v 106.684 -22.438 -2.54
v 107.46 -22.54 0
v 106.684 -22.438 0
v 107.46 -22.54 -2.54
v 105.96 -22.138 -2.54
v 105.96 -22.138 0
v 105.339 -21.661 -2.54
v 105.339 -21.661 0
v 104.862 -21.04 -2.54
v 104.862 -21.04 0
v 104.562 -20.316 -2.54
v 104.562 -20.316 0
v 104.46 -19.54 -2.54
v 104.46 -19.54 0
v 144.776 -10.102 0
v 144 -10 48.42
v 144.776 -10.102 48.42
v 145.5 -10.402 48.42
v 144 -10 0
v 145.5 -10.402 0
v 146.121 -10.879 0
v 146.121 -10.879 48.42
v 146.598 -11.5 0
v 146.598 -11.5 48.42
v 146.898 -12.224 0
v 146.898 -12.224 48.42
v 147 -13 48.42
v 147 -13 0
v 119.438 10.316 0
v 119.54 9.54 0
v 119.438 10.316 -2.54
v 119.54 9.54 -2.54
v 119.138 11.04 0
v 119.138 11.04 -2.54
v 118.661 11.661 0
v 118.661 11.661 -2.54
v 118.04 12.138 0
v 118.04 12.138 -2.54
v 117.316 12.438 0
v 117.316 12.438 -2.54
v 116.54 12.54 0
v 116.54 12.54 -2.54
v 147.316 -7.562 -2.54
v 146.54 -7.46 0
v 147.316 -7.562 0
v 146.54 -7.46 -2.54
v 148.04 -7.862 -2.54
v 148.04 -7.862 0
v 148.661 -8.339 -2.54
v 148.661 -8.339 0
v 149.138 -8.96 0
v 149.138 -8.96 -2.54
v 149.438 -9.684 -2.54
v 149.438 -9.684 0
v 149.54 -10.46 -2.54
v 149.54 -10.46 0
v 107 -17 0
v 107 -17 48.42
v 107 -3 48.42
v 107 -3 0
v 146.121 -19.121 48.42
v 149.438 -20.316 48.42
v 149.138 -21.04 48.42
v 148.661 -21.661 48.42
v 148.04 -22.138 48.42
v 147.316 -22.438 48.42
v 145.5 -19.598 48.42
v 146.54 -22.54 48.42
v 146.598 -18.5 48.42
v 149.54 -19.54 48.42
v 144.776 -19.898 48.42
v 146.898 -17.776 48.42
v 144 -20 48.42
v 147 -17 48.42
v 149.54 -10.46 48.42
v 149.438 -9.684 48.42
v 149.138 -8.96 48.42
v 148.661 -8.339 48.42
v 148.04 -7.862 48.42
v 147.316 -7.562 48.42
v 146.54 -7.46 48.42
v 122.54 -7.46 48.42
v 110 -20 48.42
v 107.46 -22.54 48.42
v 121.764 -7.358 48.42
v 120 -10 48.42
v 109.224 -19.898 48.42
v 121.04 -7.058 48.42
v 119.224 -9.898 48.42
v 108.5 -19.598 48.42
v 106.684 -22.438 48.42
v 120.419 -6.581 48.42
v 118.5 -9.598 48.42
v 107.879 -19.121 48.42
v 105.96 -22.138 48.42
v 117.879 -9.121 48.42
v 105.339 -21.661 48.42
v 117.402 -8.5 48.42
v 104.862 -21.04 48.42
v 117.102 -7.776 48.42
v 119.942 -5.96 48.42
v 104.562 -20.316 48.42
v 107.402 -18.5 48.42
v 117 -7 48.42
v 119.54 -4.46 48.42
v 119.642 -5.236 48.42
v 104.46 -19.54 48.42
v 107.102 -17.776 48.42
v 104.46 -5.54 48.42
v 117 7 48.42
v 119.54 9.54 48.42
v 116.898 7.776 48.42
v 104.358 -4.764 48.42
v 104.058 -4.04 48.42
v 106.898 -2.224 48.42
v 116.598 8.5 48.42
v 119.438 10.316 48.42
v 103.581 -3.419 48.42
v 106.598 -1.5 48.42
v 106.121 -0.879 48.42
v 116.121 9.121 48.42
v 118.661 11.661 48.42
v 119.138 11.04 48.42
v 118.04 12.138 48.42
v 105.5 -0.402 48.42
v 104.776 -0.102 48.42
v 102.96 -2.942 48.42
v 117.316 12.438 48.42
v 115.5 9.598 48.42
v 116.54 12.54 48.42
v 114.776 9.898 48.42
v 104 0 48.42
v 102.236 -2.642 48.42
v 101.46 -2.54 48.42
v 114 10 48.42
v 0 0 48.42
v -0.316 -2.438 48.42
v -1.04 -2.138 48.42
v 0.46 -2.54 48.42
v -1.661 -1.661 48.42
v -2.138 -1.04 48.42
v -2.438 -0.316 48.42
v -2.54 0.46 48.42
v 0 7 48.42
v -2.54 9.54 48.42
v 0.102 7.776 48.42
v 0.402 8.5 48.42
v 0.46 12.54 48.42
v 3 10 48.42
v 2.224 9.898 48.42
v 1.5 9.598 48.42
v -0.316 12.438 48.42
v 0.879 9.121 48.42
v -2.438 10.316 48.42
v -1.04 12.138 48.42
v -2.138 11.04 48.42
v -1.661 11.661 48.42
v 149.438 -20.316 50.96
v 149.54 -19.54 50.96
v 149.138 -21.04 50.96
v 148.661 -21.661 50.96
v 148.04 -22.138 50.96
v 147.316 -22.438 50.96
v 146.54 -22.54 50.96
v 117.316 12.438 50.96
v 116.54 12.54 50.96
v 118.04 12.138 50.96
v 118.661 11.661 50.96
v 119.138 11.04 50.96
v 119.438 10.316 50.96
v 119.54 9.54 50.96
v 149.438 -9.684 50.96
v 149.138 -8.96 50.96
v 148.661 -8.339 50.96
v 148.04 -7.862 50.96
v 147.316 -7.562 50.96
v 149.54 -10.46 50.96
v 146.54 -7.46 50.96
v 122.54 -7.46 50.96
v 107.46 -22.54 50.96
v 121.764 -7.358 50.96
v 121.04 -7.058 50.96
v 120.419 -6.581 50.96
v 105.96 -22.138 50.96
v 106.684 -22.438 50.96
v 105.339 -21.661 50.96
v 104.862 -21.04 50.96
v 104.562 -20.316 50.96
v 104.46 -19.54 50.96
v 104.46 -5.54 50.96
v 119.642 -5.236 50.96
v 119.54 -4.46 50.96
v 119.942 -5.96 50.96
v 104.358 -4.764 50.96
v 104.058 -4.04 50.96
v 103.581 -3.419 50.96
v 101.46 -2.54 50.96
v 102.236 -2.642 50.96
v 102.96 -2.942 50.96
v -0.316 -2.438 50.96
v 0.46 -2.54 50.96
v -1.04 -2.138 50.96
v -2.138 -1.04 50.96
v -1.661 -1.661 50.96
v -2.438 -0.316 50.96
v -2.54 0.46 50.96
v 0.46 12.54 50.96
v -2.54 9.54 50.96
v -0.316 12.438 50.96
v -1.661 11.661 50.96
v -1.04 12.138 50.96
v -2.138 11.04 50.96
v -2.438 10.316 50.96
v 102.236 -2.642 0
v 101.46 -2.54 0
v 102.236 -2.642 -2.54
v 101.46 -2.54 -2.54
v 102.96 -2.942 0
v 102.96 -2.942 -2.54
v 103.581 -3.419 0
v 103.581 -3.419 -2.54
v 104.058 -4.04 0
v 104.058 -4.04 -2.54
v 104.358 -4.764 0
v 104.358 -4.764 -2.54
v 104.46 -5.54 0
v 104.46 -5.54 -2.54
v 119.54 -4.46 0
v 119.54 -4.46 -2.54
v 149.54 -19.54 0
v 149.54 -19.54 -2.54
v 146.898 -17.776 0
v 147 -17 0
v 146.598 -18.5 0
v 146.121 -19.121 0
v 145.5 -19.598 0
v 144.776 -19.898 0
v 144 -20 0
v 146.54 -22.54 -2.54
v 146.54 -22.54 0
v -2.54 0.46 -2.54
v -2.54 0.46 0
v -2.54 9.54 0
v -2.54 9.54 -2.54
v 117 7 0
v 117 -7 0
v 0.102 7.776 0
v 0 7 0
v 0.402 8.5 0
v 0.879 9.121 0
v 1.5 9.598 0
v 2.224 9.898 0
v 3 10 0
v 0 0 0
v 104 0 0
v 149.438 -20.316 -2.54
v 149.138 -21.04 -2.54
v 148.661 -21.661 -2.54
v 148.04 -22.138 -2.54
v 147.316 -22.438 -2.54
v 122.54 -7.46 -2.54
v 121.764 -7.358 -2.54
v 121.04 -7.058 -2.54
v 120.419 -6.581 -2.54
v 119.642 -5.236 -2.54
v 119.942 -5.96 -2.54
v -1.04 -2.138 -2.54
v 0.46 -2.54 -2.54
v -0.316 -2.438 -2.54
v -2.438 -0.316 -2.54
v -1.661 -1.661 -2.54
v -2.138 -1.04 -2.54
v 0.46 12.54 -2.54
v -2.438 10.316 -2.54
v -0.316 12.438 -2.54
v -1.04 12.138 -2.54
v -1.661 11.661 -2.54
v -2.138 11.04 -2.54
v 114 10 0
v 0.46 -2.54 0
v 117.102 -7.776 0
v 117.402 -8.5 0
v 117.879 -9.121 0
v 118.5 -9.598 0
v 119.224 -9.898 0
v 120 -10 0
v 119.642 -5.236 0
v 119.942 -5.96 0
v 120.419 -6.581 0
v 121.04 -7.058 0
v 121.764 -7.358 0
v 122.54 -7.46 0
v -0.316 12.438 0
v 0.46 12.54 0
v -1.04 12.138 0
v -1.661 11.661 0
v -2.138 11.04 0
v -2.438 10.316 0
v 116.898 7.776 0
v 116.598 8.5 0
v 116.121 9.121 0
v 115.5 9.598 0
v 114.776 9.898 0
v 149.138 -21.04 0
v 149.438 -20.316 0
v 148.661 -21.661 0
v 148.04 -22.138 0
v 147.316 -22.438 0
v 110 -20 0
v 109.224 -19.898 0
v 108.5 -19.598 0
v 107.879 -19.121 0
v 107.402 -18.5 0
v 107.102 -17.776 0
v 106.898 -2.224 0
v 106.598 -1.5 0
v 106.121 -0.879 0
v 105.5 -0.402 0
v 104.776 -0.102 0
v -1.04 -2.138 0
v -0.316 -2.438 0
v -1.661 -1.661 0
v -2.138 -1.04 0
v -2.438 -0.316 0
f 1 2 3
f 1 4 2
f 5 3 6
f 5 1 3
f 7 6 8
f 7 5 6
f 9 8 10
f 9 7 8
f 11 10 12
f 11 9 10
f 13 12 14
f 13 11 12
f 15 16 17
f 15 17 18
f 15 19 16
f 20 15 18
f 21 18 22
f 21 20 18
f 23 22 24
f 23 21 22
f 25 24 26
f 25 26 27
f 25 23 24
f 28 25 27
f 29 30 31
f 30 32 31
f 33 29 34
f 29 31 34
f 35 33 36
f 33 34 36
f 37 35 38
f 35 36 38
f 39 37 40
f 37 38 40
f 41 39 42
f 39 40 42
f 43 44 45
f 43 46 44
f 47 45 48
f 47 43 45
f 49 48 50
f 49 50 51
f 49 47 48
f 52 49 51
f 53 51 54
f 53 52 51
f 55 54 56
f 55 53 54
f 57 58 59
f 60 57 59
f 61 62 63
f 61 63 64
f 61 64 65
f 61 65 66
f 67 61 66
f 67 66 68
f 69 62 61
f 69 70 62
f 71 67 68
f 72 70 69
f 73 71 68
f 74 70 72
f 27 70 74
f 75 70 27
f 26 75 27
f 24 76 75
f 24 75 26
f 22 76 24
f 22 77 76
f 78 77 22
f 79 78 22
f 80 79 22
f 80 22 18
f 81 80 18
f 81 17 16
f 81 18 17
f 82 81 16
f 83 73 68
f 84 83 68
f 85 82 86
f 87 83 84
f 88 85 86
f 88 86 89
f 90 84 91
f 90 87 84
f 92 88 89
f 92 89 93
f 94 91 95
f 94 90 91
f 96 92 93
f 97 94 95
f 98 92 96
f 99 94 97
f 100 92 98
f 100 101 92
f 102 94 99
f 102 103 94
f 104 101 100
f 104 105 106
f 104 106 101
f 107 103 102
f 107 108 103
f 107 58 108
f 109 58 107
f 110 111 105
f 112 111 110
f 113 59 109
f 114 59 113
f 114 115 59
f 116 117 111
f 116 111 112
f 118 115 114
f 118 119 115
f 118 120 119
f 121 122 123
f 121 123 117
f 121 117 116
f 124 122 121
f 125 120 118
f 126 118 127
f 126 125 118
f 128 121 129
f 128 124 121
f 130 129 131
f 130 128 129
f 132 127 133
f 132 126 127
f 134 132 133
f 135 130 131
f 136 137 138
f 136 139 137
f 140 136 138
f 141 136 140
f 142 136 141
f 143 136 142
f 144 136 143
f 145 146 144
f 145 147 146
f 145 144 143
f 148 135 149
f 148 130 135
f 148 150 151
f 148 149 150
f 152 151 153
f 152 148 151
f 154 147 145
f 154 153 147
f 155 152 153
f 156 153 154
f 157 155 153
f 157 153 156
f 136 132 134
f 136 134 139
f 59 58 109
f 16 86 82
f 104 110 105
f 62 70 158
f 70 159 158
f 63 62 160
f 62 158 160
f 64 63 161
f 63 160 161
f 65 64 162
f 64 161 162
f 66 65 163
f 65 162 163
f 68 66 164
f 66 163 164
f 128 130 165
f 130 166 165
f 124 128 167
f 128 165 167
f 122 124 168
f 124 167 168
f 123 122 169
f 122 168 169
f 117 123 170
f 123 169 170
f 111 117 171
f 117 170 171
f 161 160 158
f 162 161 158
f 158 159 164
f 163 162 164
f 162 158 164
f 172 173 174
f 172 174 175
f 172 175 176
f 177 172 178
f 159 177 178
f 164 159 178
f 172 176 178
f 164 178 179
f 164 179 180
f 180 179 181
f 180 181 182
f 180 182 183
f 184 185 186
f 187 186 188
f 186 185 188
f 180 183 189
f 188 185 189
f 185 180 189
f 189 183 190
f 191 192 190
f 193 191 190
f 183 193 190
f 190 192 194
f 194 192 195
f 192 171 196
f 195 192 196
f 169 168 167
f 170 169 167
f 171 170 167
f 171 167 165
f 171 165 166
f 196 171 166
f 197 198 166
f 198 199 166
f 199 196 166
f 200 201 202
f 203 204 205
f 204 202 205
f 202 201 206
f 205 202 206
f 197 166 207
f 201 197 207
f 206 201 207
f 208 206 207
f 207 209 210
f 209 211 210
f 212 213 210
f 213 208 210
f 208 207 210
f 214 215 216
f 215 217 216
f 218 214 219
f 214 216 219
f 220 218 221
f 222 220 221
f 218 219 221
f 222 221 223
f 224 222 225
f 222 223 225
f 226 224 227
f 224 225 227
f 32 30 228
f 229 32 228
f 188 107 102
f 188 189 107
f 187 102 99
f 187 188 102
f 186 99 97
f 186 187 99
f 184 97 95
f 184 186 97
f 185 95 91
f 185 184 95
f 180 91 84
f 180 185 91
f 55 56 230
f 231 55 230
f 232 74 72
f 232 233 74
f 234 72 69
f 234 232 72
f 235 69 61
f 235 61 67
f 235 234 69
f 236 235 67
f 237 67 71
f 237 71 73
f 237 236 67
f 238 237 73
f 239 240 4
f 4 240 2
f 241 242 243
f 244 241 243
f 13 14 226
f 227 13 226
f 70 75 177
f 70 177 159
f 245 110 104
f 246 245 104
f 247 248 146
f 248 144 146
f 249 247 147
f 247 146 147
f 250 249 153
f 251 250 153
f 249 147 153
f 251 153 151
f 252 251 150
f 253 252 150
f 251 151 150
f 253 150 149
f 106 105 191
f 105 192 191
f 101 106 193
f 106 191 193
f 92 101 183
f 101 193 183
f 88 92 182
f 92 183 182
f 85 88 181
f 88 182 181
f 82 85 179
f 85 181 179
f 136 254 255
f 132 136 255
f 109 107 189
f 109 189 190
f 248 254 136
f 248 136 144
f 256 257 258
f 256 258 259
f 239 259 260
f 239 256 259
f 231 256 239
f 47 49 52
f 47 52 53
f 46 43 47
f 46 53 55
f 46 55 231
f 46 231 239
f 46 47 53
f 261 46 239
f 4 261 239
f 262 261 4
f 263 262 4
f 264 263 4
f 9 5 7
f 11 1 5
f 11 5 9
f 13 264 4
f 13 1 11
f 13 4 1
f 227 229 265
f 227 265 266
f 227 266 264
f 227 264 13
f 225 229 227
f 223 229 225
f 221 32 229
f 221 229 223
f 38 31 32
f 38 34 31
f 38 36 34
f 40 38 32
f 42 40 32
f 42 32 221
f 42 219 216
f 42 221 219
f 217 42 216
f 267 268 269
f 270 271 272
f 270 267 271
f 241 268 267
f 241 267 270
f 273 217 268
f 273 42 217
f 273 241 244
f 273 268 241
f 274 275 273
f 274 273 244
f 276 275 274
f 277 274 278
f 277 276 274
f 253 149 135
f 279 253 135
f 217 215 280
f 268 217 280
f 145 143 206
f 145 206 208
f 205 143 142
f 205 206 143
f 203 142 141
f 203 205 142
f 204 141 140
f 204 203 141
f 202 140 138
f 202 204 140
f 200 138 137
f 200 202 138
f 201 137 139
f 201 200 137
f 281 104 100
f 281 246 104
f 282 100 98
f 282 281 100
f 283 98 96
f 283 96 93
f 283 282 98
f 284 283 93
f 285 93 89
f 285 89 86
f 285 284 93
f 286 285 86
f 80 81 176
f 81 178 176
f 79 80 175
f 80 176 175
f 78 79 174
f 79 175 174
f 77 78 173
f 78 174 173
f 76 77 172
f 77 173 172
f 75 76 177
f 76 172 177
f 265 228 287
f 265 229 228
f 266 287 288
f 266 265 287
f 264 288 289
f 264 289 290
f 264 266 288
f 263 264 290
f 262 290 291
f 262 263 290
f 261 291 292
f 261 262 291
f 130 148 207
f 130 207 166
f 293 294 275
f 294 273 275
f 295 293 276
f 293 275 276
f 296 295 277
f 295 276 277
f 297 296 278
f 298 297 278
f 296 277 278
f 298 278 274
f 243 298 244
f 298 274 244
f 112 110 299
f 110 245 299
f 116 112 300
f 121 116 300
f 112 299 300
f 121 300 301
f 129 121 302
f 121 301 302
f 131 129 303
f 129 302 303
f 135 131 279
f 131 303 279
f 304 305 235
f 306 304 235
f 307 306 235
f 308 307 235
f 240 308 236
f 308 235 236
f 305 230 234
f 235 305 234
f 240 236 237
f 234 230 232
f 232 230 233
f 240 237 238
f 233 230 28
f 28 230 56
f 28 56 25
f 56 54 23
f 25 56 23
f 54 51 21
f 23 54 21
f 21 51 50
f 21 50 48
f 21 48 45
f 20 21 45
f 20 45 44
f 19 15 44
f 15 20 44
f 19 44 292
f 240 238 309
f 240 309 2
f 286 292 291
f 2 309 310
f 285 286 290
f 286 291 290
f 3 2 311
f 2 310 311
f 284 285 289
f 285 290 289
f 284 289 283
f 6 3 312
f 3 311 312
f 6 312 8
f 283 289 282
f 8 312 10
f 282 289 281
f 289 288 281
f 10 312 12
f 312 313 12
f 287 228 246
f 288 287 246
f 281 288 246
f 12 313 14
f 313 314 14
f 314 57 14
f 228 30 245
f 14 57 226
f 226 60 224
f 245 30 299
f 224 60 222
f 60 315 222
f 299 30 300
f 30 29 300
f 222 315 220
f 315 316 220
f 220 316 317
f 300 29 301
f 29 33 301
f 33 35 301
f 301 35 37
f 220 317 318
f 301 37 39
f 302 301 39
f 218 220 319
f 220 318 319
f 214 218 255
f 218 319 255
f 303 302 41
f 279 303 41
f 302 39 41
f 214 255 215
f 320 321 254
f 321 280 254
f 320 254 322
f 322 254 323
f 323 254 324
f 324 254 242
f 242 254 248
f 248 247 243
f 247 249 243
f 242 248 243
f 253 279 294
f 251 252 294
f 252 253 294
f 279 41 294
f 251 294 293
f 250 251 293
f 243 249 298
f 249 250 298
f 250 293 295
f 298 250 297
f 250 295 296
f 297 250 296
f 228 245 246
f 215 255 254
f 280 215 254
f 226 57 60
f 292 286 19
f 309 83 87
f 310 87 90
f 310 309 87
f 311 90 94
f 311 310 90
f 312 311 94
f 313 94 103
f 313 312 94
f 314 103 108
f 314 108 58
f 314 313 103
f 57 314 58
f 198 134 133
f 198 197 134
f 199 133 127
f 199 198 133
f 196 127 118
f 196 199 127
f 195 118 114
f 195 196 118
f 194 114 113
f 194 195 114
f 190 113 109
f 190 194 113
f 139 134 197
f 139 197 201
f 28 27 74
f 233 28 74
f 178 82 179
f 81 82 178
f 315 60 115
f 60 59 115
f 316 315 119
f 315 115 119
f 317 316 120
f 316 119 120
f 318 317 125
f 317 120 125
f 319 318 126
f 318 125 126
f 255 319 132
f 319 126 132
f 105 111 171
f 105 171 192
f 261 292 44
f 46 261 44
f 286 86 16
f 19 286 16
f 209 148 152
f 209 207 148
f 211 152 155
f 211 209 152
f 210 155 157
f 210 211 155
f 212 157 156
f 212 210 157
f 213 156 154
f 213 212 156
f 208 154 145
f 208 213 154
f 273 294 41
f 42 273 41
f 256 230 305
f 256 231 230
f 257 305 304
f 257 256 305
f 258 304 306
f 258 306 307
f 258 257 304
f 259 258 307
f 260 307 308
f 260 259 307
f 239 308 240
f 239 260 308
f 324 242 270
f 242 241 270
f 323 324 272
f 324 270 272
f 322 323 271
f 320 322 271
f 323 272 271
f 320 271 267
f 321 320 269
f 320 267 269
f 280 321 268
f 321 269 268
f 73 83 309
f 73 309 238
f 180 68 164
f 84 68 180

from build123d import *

# Parameters (mm, degrees)
SKETCH2_W           = 107
SKETCH2_H           = 10
BOSS_EXTRUDE1_DEPTH = 48.42
BOSS_EXTRUDE2_DEPTH = 48.42
BOSS_EXTRUDE3_DEPTH = 2.54
BOSS_EXTRUDE4_DEPTH = 2.54
FILLET1_R           = 3


with BuildPart() as part:
    # Sketch2 → Boss-Extrude1 (new body)
    with BuildSketch(Plane.XY):
        with Locations((53.5, 5)):
            Rectangle(SKETCH2_W, SKETCH2_H)
    extrude(amount=BOSS_EXTRUDE1_DEPTH)

    # Sketch3 → Boss-Extrude2 (add)
    with BuildSketch(Plane.XY.offset(48.42)):
        Polygon((107, 10), (117, 10), (117, -10), (147, -10), (147, -20), (117, -20), (107, -20), align=None)
    extrude(amount=-BOSS_EXTRUDE2_DEPTH)

    # Sketch4 → Boss-Extrude3 (add)
    with BuildSketch(Plane.XY.offset(48.42)):
        Polygon((-2.54, 12.54), (119.54, 12.54), (119.54, -7.46), (149.54, -7.46), (149.54, -22.54), (104.46, -22.54), (104.46, -2.54), (-2.54, -2.54), align=None)
    extrude(amount=BOSS_EXTRUDE3_DEPTH)

    # Sketch5 → Boss-Extrude4 (add)
    with BuildSketch(Plane(origin=(0, 0, 0), x_dir=(-1, 0, 0), z_dir=(0, 0, -1))):
        Polygon((-119.54, 12.54), (-119.54, -7.46), (-149.54, -7.46), (-149.54, -22.54), (-104.46, -22.54), (-104.46, -2.54), (2.54, -2.54), (2.54, 12.54), align=None)
    extrude(amount=BOSS_EXTRUDE4_DEPTH)

    # Fillet1
    fillet1_edges = [part.edges().sort_by_distance(p)[0] for p in [
        (107, -20, 24.21),
        (117, 10, 24.21),
        (117, -10, 24.21),
        (147, -10, 24.21),
        (147, -20, 24.21),
        (-2.54, 12.54, 49.69),
        (-2.54, -2.54, 49.69),
        (104.46, -2.54, 49.69),
        (104.46, -22.54, 49.69),
        (149.54, -22.54, 49.69),
        (149.54, -7.46, 49.69),
        (119.54, -7.46, 49.69),
        (119.54, 12.54, 49.69),
        (149.54, -7.46, -1.27),
        (149.54, -22.54, -1.27),
        (104.46, -22.54, -1.27),
        (104.46, -2.54, -1.27),
        (-2.54, -2.54, -1.27),
        (-2.54, 12.54, -1.27),
        (119.54, 12.54, -1.27),
        (119.54, -7.46, -1.27),
        (0, 10, 24.21),
        (107, 0, 24.21),
    ]]
    fillet(fillet1_edges, radius=FILLET1_R)


solid = part.part
